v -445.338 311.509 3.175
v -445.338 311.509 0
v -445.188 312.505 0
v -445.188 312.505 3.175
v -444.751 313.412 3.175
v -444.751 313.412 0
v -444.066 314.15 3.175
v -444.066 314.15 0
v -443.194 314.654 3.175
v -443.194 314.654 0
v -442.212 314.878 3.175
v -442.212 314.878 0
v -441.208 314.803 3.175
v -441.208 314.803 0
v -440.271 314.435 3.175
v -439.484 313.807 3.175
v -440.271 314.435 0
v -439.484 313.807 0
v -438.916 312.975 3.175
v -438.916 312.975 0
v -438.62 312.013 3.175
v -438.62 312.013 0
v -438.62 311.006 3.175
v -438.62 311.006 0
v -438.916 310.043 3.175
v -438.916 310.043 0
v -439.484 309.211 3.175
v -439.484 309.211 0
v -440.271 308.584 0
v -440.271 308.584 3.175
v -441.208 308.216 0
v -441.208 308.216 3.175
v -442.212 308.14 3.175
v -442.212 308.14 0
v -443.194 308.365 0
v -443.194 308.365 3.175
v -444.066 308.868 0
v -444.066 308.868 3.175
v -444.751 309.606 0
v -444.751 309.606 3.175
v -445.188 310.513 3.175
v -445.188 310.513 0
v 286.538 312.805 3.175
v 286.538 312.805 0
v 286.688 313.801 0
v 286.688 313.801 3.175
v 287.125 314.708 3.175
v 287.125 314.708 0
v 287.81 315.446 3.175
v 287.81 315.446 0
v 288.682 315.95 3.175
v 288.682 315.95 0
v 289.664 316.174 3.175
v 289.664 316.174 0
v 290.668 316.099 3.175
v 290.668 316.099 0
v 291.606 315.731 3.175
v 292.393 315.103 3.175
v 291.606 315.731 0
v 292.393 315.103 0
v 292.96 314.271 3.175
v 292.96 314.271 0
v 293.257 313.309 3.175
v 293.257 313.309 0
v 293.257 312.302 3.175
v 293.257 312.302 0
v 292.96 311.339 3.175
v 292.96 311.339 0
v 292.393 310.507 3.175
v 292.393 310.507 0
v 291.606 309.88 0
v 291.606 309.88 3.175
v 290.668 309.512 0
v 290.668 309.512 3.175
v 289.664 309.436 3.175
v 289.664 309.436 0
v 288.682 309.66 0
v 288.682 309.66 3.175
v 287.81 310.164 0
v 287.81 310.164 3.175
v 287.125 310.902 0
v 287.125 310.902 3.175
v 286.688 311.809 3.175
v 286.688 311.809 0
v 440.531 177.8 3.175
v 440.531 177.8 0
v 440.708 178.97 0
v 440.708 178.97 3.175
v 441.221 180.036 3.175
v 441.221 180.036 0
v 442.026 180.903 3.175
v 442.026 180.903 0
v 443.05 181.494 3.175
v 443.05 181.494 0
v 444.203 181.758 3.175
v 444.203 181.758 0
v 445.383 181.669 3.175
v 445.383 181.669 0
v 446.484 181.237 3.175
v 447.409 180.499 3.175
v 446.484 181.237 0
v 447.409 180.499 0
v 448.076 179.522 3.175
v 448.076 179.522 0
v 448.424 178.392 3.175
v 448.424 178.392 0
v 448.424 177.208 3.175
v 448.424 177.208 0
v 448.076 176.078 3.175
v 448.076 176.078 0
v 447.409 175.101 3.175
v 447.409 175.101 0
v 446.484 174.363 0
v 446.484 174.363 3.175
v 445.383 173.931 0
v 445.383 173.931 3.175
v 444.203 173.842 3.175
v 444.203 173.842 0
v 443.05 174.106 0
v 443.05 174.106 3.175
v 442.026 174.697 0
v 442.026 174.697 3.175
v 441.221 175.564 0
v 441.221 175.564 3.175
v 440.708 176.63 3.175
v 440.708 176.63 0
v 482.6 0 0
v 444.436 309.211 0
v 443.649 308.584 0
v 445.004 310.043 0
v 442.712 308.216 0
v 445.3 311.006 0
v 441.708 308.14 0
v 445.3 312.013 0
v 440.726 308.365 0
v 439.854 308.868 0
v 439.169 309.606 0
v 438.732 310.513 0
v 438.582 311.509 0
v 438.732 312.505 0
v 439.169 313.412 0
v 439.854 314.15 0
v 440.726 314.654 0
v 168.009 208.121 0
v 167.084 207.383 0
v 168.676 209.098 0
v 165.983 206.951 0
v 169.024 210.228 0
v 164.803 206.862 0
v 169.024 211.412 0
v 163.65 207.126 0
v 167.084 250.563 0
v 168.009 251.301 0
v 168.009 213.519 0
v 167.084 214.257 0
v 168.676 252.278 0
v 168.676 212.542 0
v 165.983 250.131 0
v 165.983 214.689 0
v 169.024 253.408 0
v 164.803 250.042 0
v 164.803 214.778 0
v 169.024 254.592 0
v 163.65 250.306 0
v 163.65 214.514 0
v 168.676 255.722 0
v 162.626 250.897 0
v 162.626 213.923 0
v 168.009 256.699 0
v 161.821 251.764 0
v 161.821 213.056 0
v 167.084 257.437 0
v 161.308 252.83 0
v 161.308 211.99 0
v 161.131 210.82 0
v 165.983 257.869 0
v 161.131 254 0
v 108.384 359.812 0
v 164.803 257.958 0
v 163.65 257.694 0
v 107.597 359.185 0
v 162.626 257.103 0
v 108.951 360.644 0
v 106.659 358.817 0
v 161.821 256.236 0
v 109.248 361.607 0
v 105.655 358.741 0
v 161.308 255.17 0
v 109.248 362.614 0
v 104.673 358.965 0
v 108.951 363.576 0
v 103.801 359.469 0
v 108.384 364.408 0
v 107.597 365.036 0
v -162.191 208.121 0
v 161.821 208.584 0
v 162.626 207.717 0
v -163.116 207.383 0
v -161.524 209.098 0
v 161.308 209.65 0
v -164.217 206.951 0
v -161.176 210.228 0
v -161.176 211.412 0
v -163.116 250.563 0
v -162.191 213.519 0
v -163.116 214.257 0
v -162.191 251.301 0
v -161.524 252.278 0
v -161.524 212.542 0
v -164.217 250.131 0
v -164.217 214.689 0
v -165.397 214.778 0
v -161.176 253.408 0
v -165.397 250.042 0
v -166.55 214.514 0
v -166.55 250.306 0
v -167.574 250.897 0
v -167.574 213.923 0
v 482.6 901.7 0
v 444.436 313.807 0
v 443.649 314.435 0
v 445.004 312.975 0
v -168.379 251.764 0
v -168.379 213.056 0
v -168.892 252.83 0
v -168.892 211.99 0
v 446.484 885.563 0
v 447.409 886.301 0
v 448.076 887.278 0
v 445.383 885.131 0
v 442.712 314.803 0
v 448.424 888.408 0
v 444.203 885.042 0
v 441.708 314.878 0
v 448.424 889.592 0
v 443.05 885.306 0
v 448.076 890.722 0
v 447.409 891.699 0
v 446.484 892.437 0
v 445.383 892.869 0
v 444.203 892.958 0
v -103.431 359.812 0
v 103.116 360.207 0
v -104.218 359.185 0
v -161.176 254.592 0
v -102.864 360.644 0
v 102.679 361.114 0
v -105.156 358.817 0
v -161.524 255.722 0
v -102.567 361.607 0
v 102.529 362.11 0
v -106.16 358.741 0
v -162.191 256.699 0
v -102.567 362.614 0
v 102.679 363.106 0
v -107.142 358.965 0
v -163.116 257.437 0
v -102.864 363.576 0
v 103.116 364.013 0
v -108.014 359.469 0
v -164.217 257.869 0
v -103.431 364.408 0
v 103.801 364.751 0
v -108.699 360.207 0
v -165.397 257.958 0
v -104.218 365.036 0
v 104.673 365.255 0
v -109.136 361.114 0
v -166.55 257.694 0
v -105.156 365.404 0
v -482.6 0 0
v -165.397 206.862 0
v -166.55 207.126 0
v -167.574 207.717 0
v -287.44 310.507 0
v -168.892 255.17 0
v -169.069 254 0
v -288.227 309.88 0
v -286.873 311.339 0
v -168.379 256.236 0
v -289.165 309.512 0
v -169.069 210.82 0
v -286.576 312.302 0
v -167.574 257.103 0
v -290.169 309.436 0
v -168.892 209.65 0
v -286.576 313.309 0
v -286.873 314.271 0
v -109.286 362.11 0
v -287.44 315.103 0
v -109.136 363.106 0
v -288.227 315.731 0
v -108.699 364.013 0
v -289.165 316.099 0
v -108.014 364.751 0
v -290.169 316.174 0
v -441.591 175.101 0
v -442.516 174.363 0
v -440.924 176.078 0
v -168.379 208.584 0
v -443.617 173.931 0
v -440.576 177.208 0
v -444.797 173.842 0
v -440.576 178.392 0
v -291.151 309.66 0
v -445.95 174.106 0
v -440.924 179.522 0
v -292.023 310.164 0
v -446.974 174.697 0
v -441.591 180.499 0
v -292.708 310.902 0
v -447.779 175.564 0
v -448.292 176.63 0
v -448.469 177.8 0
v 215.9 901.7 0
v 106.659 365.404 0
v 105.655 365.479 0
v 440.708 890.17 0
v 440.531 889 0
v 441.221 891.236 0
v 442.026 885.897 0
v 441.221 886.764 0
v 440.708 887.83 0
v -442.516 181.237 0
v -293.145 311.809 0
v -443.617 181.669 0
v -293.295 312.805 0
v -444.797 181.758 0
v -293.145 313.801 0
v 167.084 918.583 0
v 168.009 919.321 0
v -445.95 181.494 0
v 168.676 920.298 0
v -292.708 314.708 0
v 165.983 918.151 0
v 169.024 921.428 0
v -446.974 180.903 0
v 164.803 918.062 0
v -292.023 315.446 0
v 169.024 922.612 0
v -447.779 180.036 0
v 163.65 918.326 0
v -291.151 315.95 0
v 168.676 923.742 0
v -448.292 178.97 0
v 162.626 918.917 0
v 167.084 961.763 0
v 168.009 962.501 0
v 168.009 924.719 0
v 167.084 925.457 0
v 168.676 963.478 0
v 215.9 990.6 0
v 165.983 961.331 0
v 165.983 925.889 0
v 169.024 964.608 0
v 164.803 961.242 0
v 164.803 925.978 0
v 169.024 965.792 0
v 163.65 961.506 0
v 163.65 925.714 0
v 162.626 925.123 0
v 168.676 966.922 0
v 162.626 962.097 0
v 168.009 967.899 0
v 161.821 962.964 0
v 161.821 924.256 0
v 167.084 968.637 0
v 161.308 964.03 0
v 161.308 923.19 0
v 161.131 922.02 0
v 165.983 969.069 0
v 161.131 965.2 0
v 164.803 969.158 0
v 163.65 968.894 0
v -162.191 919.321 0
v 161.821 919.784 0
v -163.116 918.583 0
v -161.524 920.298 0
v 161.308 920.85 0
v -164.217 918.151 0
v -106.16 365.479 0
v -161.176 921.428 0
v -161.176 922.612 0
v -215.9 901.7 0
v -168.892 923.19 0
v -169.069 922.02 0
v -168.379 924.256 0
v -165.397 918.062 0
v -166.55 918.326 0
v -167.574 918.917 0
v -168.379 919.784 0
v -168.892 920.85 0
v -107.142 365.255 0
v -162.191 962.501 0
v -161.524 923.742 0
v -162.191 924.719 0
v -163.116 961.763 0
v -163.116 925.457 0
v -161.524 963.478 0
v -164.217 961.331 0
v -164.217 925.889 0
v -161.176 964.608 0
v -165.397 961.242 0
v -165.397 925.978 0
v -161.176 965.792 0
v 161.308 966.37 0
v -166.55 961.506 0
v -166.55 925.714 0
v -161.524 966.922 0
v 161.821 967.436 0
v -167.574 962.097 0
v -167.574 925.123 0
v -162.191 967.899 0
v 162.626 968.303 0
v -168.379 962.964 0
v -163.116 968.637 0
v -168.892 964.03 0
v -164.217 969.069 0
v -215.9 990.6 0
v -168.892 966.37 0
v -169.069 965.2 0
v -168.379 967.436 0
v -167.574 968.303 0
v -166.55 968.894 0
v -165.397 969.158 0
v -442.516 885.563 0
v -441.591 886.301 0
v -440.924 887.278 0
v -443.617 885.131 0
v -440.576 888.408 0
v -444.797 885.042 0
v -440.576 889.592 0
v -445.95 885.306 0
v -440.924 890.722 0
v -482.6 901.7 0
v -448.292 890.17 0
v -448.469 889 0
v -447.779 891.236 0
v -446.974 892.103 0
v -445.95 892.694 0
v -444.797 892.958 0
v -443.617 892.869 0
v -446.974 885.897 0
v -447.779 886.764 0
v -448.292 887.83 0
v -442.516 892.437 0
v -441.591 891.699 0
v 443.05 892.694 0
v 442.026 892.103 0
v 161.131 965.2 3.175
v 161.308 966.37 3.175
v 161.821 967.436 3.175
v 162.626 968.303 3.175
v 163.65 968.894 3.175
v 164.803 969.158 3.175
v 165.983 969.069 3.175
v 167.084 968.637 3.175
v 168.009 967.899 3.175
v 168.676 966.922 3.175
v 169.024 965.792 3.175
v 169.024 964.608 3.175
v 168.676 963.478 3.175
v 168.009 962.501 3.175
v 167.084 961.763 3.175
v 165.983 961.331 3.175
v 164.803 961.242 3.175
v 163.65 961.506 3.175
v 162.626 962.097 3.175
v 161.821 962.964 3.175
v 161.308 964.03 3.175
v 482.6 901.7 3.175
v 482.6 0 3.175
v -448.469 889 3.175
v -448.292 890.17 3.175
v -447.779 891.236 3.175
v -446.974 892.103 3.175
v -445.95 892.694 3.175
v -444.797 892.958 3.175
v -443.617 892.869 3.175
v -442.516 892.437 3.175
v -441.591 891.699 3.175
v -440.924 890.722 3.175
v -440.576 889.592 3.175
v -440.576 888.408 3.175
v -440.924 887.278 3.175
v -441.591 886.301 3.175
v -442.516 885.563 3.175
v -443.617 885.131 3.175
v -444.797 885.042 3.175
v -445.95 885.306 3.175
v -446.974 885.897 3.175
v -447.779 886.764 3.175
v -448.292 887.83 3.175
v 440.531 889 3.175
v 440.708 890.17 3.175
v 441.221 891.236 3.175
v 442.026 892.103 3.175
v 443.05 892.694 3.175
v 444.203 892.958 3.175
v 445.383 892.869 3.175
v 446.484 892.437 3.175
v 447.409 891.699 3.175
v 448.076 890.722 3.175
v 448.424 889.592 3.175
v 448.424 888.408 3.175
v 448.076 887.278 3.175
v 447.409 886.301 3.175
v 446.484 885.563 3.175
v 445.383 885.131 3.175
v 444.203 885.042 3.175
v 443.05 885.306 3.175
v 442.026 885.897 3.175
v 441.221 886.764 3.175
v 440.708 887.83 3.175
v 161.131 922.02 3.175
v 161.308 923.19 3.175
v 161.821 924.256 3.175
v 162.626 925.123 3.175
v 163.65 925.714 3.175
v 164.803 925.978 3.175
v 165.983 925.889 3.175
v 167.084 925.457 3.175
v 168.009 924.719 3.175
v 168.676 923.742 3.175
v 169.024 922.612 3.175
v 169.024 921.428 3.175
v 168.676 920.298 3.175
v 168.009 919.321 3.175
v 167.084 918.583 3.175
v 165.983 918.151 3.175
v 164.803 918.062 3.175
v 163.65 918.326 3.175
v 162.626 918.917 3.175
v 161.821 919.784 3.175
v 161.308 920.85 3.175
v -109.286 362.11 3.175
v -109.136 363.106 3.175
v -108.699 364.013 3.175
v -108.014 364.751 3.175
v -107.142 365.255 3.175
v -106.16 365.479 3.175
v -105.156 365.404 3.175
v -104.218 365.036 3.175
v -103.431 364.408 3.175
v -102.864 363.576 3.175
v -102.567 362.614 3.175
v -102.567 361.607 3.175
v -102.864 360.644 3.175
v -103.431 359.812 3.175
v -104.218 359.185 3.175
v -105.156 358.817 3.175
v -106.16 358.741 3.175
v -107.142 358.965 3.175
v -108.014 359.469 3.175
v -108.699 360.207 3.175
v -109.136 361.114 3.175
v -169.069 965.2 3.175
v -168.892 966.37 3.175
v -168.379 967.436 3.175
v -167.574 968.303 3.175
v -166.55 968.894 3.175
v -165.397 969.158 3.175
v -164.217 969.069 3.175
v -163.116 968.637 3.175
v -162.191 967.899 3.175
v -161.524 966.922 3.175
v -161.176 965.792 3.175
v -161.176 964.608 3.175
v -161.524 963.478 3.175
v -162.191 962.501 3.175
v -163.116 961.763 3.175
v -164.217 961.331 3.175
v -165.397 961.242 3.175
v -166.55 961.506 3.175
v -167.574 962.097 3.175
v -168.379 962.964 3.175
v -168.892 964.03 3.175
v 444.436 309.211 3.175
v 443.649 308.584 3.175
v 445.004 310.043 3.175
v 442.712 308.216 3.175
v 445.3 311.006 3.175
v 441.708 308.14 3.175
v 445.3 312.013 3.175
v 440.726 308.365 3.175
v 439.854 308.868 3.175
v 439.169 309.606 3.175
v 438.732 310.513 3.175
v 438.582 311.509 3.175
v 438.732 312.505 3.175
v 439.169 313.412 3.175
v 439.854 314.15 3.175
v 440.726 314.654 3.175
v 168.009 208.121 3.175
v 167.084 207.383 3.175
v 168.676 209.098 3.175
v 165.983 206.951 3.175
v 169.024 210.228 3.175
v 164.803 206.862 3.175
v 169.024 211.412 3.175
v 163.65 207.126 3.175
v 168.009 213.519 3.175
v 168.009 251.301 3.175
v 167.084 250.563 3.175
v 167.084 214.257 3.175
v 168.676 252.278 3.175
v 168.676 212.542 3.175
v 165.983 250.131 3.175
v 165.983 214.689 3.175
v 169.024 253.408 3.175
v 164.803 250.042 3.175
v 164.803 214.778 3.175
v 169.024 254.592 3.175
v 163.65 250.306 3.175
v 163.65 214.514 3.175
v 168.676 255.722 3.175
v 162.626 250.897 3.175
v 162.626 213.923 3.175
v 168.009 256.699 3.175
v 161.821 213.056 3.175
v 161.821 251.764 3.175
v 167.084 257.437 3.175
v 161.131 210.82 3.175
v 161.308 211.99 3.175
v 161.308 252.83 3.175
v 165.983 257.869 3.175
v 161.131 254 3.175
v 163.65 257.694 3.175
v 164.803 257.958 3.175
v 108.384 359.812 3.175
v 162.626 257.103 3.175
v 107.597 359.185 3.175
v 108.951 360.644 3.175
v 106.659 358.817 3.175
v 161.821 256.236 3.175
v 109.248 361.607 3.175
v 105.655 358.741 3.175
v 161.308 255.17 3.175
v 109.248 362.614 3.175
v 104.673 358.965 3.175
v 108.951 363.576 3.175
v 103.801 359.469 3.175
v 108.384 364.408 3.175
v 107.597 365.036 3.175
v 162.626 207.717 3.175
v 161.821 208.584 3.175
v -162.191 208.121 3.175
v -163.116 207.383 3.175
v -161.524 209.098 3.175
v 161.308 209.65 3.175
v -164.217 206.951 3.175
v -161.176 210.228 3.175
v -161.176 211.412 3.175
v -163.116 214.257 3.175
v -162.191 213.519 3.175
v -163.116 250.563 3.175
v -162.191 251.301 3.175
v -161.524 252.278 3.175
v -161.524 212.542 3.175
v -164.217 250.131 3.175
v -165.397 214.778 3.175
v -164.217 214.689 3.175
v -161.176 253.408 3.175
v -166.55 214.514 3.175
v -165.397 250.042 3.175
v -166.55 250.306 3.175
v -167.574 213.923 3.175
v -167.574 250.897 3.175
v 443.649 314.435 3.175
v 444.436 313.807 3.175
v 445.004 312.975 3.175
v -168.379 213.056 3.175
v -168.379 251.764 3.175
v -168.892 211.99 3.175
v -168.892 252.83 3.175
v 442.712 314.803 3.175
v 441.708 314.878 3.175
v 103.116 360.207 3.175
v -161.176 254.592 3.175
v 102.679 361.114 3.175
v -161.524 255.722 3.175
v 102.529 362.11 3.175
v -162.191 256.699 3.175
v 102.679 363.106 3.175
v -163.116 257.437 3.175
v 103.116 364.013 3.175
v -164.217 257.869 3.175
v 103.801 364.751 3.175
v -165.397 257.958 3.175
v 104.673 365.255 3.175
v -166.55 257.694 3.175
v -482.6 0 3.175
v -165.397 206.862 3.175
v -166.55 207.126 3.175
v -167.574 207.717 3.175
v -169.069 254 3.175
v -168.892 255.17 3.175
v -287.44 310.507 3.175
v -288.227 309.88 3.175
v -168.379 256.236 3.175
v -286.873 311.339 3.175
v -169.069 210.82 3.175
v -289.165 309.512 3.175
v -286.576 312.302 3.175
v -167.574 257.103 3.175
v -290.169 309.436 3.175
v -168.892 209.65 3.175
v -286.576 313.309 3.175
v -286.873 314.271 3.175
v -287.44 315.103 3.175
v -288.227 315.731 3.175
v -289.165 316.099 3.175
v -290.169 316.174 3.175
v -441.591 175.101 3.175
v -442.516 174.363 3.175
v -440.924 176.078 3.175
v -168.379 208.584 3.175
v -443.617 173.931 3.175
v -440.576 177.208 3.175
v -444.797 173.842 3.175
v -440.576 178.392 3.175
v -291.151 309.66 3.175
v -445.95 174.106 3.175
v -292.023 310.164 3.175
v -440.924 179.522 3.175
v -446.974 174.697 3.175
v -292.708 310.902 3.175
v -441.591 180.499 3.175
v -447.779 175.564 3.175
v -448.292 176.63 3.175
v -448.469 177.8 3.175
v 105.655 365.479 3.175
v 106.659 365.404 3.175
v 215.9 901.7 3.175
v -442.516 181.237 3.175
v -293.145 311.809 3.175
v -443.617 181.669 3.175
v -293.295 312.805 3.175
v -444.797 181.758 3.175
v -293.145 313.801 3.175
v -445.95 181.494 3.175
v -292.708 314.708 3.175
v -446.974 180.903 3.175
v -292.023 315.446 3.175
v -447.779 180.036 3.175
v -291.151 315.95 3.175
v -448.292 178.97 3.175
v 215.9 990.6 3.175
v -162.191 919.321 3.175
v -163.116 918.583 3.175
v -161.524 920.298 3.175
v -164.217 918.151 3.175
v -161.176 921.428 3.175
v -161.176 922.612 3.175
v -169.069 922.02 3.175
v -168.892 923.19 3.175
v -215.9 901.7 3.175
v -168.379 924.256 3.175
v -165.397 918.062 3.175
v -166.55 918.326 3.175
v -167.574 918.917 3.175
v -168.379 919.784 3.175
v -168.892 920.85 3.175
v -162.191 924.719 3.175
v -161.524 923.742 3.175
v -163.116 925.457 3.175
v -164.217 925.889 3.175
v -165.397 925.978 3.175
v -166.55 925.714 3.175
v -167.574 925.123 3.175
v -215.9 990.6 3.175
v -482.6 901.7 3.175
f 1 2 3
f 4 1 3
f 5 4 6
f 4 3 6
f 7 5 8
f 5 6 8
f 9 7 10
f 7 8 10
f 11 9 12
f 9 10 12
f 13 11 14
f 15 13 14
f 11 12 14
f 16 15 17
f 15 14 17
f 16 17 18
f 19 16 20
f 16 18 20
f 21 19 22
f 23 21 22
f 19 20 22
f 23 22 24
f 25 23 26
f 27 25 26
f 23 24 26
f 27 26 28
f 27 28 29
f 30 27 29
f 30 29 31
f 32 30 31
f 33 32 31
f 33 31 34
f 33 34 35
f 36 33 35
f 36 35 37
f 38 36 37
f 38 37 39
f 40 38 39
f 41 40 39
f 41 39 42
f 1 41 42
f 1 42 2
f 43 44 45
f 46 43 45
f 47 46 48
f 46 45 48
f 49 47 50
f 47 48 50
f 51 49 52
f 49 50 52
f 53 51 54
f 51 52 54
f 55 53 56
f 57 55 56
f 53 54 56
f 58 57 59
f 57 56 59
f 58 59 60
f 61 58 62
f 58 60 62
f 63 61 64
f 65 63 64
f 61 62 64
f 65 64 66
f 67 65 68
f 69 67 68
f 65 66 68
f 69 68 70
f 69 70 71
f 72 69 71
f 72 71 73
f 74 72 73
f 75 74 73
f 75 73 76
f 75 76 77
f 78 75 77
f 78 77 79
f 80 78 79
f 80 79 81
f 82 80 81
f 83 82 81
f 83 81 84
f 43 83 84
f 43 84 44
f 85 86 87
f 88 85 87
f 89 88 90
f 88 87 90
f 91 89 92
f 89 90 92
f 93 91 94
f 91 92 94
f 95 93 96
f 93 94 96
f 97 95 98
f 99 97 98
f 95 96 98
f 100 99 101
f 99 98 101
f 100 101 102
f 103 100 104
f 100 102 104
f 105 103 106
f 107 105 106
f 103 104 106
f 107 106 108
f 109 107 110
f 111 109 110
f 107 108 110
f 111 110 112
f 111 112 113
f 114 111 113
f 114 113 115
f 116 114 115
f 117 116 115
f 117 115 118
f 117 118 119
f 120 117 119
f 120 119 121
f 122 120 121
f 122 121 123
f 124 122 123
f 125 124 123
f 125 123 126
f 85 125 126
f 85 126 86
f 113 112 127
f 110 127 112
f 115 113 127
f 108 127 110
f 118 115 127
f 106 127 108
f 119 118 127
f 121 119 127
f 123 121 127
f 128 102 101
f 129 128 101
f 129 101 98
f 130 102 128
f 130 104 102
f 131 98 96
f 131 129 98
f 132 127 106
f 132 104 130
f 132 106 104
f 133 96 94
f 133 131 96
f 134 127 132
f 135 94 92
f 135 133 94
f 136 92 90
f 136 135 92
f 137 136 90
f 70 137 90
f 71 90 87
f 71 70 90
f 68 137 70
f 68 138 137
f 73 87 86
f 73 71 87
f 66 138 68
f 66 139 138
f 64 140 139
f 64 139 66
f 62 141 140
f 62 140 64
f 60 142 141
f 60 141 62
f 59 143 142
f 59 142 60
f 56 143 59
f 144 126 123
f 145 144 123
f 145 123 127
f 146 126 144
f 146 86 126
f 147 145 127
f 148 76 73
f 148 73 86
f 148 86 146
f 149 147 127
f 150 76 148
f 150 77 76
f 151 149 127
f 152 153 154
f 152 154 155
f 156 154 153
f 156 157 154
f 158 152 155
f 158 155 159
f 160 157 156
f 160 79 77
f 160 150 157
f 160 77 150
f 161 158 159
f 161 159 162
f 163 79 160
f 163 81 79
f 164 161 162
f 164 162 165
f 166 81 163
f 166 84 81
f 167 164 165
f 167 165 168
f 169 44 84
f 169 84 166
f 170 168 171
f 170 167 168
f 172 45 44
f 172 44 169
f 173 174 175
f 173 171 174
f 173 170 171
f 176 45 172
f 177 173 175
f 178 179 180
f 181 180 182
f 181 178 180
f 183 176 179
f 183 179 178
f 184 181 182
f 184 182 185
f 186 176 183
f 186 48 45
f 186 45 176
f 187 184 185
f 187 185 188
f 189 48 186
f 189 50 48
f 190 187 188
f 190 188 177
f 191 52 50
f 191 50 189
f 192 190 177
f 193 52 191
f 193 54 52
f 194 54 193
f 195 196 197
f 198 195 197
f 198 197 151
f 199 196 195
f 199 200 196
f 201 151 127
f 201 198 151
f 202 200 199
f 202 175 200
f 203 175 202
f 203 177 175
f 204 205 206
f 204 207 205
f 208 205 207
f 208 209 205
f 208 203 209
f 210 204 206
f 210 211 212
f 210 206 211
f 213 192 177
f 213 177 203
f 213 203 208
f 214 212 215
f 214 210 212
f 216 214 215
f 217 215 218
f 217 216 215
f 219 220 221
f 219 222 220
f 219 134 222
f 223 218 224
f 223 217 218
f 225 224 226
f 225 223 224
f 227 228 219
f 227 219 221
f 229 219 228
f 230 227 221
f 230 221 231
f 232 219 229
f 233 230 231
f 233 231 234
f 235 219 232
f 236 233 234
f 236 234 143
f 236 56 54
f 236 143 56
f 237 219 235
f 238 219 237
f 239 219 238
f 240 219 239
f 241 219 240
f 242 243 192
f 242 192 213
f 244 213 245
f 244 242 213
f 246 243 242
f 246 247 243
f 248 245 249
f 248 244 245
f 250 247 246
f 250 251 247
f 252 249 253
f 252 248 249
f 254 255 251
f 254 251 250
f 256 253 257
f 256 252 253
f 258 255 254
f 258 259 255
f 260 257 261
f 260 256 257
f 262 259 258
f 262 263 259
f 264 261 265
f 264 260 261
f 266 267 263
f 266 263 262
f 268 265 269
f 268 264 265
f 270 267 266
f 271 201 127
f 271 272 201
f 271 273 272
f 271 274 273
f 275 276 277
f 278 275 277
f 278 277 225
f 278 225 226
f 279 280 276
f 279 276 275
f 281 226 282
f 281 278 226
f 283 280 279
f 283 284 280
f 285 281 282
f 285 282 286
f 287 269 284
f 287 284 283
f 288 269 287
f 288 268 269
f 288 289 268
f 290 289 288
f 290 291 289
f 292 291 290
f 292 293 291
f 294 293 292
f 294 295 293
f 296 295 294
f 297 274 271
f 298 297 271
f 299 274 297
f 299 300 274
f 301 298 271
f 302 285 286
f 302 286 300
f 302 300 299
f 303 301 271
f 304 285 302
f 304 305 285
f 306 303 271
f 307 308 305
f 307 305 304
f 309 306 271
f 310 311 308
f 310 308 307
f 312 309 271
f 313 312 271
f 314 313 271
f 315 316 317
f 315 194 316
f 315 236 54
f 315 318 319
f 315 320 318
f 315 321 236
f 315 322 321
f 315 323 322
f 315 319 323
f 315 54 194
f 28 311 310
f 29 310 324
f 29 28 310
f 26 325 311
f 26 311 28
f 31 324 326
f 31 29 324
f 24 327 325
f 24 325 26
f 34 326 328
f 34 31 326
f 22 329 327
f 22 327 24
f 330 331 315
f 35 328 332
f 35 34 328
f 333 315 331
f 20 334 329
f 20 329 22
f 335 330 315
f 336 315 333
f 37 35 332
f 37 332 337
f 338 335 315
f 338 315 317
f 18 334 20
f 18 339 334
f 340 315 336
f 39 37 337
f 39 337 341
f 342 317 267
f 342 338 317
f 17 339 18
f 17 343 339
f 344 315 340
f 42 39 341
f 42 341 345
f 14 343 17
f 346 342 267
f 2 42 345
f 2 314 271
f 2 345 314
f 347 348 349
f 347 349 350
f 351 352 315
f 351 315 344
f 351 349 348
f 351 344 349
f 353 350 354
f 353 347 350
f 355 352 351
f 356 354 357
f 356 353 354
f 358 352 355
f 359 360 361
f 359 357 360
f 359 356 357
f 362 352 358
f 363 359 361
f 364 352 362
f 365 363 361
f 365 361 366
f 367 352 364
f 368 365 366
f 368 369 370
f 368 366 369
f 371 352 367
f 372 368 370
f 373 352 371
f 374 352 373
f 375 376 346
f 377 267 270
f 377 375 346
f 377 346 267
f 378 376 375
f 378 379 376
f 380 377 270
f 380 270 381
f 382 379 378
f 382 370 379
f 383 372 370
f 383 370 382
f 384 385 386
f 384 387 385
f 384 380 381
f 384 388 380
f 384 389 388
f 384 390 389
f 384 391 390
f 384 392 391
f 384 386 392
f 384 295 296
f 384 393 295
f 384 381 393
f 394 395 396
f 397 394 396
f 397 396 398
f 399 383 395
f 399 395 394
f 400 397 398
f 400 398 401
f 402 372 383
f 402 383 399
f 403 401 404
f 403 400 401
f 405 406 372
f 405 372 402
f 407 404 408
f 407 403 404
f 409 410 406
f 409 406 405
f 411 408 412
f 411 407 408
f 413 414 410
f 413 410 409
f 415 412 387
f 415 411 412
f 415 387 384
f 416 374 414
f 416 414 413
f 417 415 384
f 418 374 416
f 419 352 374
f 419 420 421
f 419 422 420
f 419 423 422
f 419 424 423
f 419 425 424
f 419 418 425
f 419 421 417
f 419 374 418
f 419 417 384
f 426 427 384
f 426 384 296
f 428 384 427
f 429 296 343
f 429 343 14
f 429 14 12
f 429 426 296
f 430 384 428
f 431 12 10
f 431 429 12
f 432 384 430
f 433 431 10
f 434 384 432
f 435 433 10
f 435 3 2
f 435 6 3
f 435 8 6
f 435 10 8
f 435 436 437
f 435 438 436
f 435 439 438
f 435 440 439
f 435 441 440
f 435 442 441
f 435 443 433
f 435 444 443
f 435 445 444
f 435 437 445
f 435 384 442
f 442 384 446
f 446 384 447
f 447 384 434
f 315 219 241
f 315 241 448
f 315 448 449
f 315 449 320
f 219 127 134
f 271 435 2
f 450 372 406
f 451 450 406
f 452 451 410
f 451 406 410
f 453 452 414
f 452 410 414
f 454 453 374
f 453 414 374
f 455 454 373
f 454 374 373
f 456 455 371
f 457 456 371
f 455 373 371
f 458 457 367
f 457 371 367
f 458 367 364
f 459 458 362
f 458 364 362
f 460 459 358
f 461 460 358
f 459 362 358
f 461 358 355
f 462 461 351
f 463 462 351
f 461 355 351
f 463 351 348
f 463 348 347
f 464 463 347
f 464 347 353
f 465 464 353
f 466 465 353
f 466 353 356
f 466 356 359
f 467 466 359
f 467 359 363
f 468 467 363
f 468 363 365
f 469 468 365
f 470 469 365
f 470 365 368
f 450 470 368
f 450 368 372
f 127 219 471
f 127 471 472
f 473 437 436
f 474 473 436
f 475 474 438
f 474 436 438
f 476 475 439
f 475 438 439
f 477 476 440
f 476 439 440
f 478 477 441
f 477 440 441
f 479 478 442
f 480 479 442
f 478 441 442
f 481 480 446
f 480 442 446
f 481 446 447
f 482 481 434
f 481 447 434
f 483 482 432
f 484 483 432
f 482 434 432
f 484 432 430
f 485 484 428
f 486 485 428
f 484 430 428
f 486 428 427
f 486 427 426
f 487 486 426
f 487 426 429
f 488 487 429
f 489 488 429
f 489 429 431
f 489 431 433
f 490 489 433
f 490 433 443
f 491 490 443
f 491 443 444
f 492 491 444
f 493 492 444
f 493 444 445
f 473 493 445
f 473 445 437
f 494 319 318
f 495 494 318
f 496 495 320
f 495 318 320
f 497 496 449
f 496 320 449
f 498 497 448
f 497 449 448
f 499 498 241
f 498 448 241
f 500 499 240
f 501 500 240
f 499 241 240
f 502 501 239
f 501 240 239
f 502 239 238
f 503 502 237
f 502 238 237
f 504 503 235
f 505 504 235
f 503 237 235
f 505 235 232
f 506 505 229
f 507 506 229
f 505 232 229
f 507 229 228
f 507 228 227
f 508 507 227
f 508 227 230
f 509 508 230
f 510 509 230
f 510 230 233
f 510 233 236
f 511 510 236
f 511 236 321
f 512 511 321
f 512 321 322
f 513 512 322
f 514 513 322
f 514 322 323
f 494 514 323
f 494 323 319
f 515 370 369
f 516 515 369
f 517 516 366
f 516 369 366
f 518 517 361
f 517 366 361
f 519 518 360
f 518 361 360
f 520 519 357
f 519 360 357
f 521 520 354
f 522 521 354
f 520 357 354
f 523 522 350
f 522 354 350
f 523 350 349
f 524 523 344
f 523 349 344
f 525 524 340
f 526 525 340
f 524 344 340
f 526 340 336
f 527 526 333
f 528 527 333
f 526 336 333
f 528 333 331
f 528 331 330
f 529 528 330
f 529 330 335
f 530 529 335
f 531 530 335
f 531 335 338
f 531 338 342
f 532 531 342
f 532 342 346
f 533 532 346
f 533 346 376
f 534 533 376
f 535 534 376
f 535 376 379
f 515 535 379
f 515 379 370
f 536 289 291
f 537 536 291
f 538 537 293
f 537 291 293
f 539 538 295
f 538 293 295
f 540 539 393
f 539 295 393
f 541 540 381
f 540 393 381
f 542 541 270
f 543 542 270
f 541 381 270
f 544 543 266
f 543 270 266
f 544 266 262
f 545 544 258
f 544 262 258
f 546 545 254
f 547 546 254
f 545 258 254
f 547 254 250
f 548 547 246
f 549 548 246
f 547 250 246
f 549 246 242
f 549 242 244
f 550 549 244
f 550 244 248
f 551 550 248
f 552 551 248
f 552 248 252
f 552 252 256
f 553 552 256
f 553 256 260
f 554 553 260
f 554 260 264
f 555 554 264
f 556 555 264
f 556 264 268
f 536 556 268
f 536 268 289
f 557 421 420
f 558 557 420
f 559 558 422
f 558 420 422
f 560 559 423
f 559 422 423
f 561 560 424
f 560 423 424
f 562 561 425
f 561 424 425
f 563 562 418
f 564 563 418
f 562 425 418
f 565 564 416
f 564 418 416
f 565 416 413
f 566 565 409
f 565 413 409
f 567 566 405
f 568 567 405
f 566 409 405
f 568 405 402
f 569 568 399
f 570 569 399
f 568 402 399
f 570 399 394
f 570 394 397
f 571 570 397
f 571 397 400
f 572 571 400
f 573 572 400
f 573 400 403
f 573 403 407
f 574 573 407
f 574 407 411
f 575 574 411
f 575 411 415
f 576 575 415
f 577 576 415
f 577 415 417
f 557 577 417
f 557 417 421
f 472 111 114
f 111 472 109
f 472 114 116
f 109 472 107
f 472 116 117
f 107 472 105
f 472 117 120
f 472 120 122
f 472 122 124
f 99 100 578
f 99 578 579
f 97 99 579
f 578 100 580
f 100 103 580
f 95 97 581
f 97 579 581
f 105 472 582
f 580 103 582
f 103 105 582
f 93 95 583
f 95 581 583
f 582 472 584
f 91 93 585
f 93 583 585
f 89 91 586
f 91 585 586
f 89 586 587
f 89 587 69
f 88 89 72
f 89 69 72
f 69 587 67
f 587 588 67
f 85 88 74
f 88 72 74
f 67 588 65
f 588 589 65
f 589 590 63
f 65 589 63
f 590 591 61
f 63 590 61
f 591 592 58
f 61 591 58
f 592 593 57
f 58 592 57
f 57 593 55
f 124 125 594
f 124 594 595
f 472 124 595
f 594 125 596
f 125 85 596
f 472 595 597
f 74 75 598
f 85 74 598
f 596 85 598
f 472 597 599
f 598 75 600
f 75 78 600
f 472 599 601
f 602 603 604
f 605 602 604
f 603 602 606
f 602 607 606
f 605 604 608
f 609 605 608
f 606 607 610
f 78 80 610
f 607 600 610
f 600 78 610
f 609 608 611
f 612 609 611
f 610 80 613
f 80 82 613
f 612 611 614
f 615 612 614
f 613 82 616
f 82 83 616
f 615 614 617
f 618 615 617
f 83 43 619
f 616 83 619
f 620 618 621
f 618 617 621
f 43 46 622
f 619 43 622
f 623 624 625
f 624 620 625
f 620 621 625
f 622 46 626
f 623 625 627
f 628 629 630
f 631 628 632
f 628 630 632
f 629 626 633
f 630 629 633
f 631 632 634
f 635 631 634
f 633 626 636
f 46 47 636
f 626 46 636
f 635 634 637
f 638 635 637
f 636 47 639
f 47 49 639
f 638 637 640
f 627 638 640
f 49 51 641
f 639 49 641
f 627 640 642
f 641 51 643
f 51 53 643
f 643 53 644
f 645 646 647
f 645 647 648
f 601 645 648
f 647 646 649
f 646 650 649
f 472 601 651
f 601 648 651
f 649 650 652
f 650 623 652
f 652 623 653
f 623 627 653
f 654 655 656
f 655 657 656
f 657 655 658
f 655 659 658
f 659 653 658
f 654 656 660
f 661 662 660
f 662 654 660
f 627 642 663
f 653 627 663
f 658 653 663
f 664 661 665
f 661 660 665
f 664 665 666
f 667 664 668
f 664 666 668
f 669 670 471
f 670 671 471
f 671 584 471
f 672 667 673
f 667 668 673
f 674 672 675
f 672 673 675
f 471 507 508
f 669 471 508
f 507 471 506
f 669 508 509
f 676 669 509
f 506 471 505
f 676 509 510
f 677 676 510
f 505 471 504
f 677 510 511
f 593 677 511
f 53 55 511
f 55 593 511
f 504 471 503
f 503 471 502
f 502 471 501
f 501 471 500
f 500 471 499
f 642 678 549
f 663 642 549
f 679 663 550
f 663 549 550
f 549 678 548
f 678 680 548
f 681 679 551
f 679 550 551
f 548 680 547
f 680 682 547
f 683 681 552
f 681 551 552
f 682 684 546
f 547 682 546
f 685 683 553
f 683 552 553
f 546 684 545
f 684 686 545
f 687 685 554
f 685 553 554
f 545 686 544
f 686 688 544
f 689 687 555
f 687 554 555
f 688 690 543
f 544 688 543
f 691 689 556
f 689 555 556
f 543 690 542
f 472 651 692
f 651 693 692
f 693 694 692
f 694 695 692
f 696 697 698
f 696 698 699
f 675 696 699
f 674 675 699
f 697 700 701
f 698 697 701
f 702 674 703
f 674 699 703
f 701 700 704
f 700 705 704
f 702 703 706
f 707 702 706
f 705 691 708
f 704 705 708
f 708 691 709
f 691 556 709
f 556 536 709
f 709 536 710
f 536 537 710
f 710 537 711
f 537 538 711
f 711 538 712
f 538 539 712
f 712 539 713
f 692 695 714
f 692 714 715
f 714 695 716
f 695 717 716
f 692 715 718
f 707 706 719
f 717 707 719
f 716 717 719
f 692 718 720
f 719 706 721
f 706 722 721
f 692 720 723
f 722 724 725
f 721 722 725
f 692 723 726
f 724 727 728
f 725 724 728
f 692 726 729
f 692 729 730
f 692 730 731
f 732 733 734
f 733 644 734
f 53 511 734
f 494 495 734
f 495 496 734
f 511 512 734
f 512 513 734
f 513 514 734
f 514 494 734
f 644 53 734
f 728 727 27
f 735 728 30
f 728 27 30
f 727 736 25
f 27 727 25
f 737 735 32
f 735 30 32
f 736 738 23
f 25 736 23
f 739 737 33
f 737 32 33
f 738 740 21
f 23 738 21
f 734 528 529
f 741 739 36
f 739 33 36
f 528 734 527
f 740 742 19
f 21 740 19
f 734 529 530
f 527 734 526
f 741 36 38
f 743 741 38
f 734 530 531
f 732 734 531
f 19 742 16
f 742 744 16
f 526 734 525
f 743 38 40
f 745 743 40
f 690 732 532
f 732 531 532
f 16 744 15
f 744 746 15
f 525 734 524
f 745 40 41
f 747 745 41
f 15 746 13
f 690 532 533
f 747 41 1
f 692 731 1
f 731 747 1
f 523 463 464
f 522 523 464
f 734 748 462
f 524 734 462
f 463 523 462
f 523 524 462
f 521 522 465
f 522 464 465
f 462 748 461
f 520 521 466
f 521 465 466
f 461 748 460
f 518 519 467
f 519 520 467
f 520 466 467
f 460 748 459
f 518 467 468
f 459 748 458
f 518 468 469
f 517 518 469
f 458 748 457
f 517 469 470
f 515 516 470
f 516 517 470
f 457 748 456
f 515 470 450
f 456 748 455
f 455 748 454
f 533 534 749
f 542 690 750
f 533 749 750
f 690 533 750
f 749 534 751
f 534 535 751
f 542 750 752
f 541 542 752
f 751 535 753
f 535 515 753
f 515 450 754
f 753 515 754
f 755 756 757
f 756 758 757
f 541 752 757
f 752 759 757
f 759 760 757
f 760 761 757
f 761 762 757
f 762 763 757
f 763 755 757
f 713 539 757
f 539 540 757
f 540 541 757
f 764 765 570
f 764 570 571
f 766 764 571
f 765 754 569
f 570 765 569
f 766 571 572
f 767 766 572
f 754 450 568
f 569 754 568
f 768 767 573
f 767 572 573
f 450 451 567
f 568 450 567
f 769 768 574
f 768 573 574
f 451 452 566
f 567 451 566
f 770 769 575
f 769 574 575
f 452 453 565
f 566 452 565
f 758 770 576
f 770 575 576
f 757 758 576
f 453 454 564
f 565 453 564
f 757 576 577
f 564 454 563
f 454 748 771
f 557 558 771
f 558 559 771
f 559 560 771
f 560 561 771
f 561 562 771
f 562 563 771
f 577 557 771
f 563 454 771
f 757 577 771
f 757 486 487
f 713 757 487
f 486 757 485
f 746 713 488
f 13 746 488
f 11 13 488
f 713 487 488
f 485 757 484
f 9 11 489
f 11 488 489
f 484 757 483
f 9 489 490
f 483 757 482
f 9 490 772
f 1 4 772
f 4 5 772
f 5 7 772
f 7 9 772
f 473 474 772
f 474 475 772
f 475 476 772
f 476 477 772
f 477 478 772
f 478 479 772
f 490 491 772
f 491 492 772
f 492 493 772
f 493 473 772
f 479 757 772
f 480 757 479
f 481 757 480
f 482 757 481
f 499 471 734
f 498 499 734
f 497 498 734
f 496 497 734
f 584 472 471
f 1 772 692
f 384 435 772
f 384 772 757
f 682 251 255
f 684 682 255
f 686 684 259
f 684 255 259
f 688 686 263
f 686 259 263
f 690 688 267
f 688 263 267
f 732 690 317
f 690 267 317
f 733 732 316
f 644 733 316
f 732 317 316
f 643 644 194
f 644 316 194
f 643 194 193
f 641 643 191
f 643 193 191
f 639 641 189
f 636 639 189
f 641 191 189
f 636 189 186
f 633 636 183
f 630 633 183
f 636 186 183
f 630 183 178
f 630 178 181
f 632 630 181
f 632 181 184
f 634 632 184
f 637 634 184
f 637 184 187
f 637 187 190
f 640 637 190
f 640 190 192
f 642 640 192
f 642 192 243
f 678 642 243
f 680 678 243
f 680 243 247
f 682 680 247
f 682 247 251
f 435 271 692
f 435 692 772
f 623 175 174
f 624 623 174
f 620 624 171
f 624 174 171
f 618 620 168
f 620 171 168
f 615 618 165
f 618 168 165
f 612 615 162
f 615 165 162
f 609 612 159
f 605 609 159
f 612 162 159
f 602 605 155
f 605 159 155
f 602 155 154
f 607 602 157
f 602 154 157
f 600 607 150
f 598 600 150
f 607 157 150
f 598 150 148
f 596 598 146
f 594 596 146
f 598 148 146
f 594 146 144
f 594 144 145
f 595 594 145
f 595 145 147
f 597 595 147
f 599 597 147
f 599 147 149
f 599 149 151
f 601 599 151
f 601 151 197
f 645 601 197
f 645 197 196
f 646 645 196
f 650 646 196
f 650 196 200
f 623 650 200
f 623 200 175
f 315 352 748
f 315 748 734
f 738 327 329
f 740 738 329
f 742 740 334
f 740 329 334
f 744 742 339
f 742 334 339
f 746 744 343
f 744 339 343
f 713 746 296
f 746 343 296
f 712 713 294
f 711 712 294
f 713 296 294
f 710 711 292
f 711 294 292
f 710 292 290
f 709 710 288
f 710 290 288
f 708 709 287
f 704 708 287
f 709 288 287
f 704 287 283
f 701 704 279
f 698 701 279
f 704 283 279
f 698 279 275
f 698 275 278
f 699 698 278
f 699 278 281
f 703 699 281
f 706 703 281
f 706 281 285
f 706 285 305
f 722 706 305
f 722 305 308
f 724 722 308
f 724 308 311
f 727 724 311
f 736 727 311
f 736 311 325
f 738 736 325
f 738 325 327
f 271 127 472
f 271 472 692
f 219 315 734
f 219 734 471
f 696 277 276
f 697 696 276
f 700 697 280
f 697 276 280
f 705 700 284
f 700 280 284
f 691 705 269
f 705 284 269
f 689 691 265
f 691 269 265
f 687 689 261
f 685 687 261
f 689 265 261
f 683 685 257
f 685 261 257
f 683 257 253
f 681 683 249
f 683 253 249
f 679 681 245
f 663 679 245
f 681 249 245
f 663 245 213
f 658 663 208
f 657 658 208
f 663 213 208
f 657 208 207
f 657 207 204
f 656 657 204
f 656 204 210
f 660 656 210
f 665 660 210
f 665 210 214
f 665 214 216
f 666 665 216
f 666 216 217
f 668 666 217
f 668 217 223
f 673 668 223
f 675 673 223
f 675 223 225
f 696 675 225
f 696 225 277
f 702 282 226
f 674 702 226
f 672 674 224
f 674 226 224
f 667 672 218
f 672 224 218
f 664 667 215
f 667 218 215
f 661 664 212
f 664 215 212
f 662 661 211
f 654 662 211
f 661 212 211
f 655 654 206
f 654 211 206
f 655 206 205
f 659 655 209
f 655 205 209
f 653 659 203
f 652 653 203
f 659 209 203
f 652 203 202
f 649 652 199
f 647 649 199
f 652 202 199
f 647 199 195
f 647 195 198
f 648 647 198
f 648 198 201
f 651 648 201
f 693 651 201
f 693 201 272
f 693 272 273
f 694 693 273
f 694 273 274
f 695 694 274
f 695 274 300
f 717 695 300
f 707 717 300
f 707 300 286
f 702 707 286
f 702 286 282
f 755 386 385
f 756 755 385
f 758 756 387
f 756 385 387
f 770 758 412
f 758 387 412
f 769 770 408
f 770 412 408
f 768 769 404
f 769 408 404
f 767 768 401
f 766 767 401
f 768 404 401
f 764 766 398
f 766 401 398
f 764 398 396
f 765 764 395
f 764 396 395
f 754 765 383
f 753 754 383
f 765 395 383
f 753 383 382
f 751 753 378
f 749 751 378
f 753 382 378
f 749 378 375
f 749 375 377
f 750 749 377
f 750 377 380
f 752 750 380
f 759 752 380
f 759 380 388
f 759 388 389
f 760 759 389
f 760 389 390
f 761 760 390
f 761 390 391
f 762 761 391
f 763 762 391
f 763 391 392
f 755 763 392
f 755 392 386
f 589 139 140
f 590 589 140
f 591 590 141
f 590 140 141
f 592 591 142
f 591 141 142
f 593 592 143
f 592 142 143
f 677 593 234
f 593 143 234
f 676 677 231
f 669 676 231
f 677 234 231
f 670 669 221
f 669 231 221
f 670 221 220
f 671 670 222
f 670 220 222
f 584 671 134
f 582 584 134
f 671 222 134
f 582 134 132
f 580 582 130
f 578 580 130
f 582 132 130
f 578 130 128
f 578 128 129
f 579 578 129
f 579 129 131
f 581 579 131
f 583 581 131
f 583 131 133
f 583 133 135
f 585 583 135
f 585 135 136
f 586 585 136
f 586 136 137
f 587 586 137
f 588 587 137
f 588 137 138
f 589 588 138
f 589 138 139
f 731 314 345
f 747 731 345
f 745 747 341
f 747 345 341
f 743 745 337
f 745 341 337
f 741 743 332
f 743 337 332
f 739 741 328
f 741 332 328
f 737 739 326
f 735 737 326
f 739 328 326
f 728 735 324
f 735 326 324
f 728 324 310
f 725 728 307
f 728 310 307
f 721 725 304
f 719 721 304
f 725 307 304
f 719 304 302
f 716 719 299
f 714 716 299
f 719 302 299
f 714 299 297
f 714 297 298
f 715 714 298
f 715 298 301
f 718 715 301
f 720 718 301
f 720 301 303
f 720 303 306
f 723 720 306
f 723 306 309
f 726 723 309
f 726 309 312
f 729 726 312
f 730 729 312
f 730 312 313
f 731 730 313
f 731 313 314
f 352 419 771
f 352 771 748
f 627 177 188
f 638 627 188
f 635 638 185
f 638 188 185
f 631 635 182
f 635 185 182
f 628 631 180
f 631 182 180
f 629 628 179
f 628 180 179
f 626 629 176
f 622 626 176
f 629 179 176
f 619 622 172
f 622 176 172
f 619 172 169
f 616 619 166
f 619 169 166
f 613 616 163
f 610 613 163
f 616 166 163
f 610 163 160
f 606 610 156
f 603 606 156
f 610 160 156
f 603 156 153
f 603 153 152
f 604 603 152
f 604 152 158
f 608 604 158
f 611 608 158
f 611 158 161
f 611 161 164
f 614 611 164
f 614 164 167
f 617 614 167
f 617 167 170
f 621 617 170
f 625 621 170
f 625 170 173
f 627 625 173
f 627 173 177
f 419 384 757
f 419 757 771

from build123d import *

# Parameters (mm, degrees)
BOSS_EXTRUDE1_DEPTH            = 3.175
F_1_4_CLEARANCE_HOLE1_D        = 6.7564
F_5_16_0_3125_DIAMETER_HOLE1_D = 7.9375


with BuildPart() as part:
    # Sketch2 → Boss-Extrude1 (new body)
    with BuildSketch(Plane.XY):
        Polygon((-482.6, 901.7), (-215.9, 901.7), (-215.9, 990.6), (215.9, 990.6), (215.9, 901.7), (482.6, 901.7), (482.6, 0), (-482.6, 0), align=None)
    extrude(amount=BOSS_EXTRUDE1_DEPTH)

    # 1/4 Clearance Hole1 (through all)
    with Locations(Plane.XY.offset(3.175)):
        with Locations((-441.96, 311.50918615), (105.907561142, 362.110143283), (289.91643105, 312.805115191), (-289.91643105, 312.805115191), (-105.907561142, 362.110143283), (441.96, 311.50918615)):
            Hole(F_1_4_CLEARANCE_HOLE1_D / 2)

    # 5/16 (0.3125) Diameter Hole1 (through all)
    with Locations(Plane.XY.offset(3.175)):
        with Locations((-165.1, 922.02), (-165.1, 965.2), (165.1, 965.2), (165.1, 922.02), (-165.1, 210.82), (-165.1, 254), (165.1, 254), (165.1, 210.82), (-444.5, 177.8), (444.5, 177.8), (-444.5, 889), (444.5, 889)):
            Hole(F_5_16_0_3125_DIAMETER_HOLE1_D / 2)


solid = part.part
